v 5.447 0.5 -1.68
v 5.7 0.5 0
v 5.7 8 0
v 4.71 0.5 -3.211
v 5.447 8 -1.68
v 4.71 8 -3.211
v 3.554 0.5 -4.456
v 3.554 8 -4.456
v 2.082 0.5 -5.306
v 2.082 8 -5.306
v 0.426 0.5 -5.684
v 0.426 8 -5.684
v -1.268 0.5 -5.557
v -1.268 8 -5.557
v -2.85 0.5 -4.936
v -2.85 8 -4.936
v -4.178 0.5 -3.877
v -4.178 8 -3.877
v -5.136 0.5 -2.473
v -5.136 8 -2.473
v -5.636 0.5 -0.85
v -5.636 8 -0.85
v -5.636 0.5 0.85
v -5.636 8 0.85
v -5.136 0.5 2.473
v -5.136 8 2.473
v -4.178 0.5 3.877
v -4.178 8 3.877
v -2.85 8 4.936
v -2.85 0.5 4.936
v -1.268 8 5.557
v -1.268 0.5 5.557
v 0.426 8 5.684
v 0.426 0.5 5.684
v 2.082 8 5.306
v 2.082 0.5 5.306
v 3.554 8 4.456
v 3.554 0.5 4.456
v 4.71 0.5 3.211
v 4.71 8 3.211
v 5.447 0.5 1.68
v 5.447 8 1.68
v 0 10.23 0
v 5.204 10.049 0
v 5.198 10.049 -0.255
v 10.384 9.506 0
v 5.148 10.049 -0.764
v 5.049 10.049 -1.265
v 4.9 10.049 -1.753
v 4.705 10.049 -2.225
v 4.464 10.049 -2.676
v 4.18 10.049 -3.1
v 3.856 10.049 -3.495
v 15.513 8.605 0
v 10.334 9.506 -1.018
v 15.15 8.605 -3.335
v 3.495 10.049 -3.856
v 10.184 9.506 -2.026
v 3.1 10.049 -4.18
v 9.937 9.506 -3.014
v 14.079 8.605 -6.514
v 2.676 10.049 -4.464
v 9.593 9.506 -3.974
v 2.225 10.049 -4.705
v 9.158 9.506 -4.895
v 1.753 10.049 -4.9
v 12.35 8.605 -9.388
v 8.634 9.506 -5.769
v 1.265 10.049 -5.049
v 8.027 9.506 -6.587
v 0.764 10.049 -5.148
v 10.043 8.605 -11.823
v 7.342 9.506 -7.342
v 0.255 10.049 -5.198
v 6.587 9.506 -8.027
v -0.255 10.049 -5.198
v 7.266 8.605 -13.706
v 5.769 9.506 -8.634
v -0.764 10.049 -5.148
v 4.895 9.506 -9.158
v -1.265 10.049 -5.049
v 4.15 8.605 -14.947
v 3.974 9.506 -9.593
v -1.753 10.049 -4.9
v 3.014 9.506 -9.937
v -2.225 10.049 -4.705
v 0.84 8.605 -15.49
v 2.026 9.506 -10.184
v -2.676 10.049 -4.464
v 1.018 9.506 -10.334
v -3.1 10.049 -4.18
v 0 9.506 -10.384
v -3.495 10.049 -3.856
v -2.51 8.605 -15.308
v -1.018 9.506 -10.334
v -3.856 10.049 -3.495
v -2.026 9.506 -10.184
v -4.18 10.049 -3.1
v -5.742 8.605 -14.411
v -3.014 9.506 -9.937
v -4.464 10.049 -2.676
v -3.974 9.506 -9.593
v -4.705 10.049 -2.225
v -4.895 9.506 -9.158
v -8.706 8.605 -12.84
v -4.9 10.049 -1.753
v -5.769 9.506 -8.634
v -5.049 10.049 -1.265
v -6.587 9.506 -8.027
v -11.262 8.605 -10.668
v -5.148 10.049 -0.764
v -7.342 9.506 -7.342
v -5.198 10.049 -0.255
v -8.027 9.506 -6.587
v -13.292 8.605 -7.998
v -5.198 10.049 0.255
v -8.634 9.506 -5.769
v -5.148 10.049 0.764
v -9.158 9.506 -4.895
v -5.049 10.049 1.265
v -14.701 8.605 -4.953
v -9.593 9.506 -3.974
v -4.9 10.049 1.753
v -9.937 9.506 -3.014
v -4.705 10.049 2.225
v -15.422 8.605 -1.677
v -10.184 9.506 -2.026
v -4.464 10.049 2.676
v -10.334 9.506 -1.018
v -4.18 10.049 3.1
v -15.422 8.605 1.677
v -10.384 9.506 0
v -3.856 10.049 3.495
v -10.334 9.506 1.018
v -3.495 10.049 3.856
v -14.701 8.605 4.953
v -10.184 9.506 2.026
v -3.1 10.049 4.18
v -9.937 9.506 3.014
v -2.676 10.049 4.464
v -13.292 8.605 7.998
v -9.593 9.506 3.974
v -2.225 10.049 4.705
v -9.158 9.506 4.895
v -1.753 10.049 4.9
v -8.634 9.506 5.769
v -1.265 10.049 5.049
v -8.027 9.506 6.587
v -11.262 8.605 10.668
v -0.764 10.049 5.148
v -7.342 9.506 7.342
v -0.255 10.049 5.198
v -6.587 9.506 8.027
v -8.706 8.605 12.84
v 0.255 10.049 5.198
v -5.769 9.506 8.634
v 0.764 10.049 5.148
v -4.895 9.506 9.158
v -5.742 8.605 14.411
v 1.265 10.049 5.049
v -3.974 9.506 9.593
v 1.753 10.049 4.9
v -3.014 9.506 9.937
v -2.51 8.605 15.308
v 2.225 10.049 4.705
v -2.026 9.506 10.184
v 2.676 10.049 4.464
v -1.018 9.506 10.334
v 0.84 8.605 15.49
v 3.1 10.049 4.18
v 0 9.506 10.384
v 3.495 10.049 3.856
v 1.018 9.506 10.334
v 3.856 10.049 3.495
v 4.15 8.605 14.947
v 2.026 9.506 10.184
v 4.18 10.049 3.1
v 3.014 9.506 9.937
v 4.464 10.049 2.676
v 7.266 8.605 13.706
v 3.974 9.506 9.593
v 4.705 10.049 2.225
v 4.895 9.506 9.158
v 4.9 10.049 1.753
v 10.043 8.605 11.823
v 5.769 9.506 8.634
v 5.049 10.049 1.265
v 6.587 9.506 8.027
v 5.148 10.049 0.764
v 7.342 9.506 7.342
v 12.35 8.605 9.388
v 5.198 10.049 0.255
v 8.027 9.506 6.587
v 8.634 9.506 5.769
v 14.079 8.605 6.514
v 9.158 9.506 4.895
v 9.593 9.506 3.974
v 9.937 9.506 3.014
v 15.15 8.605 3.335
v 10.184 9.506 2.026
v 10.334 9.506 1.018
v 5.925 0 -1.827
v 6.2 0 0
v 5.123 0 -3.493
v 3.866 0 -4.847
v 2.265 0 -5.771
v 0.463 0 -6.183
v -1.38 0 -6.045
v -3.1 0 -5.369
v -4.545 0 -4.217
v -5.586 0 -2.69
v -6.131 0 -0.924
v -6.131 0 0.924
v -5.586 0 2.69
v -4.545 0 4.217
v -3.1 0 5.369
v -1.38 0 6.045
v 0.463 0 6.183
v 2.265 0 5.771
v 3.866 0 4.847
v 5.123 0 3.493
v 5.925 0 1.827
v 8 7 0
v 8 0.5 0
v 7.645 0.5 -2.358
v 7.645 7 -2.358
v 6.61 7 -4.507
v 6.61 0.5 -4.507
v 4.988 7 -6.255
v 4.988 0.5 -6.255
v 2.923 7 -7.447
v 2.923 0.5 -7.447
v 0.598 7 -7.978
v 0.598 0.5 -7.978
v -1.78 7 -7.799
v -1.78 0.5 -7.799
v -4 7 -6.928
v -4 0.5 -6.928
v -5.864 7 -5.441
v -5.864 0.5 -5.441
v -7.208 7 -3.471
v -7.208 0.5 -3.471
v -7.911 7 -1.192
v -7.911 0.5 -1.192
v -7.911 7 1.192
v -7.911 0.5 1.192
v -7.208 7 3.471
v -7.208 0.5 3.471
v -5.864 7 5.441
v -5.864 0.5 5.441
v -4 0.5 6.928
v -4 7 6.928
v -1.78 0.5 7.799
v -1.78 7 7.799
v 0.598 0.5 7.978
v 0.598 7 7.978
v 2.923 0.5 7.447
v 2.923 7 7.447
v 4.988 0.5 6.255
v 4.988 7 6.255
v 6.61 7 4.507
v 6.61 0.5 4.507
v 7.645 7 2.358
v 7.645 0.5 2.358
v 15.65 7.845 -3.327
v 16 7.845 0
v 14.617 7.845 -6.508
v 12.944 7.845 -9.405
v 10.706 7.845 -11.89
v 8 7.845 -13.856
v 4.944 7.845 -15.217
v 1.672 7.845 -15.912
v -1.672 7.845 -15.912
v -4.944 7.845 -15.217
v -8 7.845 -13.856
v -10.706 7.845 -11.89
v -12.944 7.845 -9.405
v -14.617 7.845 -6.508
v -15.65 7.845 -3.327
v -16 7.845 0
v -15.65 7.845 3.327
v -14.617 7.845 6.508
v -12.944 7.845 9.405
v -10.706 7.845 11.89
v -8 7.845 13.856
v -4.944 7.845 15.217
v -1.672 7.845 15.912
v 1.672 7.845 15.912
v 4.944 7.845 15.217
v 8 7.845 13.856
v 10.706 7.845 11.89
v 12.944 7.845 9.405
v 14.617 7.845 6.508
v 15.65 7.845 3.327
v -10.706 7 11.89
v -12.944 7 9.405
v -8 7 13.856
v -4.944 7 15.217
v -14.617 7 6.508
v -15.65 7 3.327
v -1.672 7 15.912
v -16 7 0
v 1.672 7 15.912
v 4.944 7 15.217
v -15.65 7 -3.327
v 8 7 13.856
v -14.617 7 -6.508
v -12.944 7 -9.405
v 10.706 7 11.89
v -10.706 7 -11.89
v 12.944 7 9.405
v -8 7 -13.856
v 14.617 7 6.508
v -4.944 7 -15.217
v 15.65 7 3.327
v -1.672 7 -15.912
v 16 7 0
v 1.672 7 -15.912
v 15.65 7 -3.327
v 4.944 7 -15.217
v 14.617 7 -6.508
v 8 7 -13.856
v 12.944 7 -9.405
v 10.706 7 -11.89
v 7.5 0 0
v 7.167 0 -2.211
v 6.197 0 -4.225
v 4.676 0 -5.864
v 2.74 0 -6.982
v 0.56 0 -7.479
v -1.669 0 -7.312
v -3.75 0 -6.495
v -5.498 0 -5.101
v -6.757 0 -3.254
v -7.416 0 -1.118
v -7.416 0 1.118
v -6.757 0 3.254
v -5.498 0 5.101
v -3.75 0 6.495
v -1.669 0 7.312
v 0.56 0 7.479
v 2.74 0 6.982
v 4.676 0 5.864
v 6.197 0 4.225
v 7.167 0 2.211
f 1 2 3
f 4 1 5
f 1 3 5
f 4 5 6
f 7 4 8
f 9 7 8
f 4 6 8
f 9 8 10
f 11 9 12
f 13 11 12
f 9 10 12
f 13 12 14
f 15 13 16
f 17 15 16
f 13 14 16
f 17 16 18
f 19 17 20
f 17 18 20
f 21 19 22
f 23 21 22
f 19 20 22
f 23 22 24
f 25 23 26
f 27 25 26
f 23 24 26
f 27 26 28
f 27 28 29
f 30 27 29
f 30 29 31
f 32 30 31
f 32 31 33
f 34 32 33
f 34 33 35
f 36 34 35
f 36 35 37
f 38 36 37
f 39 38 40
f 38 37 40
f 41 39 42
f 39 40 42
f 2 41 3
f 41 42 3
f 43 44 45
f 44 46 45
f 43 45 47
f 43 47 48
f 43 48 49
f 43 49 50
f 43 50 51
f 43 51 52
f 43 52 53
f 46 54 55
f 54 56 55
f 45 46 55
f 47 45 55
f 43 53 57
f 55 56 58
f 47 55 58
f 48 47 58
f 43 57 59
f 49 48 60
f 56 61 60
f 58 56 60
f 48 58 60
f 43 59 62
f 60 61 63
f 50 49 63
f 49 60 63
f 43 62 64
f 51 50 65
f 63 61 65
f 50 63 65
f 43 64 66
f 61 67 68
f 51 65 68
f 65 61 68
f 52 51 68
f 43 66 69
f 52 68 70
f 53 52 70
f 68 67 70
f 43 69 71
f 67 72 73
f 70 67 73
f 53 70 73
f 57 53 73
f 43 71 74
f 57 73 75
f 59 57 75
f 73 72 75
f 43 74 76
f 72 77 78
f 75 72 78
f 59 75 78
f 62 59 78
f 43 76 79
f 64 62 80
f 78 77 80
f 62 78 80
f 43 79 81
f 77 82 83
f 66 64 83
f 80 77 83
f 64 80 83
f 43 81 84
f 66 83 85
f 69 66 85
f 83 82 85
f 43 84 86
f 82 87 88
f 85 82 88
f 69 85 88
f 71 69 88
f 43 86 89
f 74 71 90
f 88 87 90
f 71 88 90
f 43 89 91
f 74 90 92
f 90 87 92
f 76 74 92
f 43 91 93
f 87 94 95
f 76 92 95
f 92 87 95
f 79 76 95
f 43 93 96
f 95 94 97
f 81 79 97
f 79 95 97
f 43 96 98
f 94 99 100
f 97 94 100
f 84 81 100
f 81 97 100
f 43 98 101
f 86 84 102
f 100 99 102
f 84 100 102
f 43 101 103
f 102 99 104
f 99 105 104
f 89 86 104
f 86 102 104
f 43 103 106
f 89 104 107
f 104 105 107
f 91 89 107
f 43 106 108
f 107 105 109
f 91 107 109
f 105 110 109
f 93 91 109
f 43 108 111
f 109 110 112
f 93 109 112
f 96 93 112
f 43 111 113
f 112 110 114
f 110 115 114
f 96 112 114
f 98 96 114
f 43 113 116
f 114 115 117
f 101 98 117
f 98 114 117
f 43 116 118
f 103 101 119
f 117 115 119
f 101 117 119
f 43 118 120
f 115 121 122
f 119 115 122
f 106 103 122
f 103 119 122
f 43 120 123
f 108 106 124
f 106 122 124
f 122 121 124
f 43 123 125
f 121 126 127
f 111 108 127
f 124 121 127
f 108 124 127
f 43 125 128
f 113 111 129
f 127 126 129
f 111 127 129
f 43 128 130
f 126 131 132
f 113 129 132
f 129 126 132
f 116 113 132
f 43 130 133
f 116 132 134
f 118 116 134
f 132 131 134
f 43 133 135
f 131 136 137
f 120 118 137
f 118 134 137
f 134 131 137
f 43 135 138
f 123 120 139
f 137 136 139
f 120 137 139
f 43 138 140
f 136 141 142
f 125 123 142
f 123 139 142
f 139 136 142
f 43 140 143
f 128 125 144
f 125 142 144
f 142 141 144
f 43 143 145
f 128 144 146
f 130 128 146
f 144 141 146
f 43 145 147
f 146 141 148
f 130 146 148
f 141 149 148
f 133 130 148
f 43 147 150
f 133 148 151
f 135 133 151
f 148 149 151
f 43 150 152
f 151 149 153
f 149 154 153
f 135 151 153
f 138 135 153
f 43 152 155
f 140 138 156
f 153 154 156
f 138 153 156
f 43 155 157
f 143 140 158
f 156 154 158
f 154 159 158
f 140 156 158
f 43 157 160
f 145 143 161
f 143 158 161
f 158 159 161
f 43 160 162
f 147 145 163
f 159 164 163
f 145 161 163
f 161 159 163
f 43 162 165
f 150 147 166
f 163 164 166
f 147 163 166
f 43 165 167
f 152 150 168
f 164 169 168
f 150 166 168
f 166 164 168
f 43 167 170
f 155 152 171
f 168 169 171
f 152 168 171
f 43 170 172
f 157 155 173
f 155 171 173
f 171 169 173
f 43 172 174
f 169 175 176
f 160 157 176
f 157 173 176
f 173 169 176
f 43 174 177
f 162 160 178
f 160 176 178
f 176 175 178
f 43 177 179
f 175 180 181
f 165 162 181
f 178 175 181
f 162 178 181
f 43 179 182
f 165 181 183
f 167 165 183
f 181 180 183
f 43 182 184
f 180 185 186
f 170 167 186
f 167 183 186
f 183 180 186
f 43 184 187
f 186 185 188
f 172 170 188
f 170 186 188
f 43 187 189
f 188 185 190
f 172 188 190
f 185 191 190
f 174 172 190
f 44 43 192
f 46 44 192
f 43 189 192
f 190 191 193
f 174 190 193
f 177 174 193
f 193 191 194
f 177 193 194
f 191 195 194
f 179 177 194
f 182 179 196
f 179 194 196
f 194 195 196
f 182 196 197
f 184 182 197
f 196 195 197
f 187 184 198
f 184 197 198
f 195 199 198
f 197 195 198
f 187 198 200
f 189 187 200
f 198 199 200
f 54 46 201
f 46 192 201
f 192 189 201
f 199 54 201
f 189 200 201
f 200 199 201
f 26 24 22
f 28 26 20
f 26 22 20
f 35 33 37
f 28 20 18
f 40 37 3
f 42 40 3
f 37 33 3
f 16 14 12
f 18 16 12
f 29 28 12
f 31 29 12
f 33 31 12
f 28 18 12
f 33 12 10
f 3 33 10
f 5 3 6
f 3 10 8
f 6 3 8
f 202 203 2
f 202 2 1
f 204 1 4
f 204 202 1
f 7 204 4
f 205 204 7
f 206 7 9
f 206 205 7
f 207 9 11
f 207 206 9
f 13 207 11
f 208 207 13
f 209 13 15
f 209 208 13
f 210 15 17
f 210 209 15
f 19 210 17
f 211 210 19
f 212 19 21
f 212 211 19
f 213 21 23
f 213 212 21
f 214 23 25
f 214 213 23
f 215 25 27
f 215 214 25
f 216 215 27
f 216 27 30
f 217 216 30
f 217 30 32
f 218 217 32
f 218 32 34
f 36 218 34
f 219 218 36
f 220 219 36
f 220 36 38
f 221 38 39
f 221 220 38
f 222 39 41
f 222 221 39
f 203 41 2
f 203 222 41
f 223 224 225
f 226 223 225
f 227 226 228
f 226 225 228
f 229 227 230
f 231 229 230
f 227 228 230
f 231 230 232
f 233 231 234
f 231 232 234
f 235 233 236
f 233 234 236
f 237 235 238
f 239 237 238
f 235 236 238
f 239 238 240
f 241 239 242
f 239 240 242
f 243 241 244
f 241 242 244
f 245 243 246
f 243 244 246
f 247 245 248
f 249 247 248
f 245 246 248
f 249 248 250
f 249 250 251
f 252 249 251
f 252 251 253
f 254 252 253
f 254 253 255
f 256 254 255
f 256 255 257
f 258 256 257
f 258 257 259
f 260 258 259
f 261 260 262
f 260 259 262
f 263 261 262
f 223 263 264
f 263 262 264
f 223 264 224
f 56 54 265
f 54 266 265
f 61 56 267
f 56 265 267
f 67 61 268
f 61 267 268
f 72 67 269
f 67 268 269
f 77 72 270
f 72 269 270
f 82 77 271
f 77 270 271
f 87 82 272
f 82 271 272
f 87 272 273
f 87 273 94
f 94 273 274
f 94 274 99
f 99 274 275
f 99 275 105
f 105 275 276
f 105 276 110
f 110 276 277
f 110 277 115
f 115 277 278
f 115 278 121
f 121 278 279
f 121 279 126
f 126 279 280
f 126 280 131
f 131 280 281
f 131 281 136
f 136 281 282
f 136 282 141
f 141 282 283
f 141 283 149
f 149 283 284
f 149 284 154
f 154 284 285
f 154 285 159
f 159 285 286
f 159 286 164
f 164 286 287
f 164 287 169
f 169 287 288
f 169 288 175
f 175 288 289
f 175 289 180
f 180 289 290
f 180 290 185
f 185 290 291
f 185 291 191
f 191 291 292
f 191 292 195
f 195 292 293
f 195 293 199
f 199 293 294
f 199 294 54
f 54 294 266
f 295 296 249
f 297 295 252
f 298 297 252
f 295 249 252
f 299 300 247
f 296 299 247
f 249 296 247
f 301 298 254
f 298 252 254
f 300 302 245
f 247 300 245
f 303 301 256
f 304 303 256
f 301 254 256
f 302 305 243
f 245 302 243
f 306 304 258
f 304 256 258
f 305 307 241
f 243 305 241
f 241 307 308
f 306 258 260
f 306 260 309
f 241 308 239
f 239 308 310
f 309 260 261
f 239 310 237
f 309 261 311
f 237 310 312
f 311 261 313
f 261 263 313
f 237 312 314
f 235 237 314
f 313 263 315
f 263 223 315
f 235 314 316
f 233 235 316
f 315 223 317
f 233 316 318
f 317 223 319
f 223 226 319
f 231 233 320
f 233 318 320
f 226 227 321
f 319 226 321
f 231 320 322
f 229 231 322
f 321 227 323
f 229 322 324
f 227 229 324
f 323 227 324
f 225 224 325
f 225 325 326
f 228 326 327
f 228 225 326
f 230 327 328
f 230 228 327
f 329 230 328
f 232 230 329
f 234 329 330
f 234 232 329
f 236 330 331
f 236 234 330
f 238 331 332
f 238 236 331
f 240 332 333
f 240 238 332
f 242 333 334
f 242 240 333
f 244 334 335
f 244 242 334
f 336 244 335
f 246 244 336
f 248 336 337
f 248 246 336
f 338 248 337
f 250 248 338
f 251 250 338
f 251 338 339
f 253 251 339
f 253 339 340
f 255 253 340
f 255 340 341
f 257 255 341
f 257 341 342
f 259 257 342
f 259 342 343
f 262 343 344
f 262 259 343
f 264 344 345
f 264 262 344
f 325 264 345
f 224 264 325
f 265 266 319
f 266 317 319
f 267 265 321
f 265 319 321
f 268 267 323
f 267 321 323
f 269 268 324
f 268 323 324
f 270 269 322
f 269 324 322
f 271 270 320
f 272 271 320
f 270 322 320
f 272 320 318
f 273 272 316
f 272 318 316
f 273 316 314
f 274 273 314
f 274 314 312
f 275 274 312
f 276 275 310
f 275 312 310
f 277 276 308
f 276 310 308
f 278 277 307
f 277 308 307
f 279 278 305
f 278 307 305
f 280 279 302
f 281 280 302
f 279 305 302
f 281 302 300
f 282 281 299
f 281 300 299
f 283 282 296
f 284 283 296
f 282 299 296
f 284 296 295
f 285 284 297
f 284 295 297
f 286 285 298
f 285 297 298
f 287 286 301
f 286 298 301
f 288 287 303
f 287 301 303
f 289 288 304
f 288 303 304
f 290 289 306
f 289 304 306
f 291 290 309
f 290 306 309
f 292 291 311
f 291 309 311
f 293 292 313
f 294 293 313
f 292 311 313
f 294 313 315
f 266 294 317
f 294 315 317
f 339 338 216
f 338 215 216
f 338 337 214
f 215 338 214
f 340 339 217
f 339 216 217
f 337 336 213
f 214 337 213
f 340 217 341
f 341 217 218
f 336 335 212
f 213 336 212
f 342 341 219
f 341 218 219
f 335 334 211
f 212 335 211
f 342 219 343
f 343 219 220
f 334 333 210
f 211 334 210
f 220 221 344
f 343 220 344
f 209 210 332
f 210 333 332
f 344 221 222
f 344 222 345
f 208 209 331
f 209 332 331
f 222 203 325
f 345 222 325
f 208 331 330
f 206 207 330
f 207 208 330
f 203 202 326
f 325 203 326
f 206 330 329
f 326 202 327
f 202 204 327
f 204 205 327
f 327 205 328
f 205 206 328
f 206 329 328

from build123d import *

# Parameters (mm, degrees)
CHAMFER_1_SIZE = 0.655190236
CHAMFER_2_SIZE = 0.5


with BuildPart() as part:
    # ｽｹｯﾁ1 → 回転1 (revolve)
    with BuildSketch(Plane.XY):
        with BuildLine():
            Line((5.7, 0), (5.7, 8))
            Line((5.7, 8), (0, 8))
            Line((0, 8), (0, 10.23))
            ThreePointArc((0, 10.23), (8.046628176, 9.796243245), (16, 8.5))
            Line((16, 8.5), (16, 7))
            Line((16, 7), (8, 7))
            Line((8, 7), (8, 0))
            Line((8, 0), (5.7, 0))
        make_face()
    revolve(axis=Axis((0, 8, 0), (0, 1, 0)))

    # 面取り1
    # the kernel refuses this chamfer: 0.655190236, 0.5 mm, written as the material it takes off along each edge
    with BuildSketch(Plane(origin=(0, 8.5, 0), x_dir=(1, 0, 0), z_dir=(0, 0, 1))) as chamfer_1_piece_1:
        with BuildLine():
            Line((15.512821873, 0.104900382), (16, -CHAMFER_1_SIZE))
            Line((16, -CHAMFER_1_SIZE), (16, 0))
            ThreePointArc((16, 0), (15.747471206, 0.054798761), (15.512821873, 0.104900382))
        make_face()
    revolve(axis=Axis((0, 8.5, 0), (0, 1, 0)), mode=Mode.SUBTRACT)

    # 面取り2
    chamfer_2_edges = [part.edges().sort_by_distance(p)[0] for p in [
        (-5.7, 0, 0),
        (-8, 0, 0),
    ]]
    chamfer(chamfer_2_edges, length=CHAMFER_2_SIZE)


solid = part.part
